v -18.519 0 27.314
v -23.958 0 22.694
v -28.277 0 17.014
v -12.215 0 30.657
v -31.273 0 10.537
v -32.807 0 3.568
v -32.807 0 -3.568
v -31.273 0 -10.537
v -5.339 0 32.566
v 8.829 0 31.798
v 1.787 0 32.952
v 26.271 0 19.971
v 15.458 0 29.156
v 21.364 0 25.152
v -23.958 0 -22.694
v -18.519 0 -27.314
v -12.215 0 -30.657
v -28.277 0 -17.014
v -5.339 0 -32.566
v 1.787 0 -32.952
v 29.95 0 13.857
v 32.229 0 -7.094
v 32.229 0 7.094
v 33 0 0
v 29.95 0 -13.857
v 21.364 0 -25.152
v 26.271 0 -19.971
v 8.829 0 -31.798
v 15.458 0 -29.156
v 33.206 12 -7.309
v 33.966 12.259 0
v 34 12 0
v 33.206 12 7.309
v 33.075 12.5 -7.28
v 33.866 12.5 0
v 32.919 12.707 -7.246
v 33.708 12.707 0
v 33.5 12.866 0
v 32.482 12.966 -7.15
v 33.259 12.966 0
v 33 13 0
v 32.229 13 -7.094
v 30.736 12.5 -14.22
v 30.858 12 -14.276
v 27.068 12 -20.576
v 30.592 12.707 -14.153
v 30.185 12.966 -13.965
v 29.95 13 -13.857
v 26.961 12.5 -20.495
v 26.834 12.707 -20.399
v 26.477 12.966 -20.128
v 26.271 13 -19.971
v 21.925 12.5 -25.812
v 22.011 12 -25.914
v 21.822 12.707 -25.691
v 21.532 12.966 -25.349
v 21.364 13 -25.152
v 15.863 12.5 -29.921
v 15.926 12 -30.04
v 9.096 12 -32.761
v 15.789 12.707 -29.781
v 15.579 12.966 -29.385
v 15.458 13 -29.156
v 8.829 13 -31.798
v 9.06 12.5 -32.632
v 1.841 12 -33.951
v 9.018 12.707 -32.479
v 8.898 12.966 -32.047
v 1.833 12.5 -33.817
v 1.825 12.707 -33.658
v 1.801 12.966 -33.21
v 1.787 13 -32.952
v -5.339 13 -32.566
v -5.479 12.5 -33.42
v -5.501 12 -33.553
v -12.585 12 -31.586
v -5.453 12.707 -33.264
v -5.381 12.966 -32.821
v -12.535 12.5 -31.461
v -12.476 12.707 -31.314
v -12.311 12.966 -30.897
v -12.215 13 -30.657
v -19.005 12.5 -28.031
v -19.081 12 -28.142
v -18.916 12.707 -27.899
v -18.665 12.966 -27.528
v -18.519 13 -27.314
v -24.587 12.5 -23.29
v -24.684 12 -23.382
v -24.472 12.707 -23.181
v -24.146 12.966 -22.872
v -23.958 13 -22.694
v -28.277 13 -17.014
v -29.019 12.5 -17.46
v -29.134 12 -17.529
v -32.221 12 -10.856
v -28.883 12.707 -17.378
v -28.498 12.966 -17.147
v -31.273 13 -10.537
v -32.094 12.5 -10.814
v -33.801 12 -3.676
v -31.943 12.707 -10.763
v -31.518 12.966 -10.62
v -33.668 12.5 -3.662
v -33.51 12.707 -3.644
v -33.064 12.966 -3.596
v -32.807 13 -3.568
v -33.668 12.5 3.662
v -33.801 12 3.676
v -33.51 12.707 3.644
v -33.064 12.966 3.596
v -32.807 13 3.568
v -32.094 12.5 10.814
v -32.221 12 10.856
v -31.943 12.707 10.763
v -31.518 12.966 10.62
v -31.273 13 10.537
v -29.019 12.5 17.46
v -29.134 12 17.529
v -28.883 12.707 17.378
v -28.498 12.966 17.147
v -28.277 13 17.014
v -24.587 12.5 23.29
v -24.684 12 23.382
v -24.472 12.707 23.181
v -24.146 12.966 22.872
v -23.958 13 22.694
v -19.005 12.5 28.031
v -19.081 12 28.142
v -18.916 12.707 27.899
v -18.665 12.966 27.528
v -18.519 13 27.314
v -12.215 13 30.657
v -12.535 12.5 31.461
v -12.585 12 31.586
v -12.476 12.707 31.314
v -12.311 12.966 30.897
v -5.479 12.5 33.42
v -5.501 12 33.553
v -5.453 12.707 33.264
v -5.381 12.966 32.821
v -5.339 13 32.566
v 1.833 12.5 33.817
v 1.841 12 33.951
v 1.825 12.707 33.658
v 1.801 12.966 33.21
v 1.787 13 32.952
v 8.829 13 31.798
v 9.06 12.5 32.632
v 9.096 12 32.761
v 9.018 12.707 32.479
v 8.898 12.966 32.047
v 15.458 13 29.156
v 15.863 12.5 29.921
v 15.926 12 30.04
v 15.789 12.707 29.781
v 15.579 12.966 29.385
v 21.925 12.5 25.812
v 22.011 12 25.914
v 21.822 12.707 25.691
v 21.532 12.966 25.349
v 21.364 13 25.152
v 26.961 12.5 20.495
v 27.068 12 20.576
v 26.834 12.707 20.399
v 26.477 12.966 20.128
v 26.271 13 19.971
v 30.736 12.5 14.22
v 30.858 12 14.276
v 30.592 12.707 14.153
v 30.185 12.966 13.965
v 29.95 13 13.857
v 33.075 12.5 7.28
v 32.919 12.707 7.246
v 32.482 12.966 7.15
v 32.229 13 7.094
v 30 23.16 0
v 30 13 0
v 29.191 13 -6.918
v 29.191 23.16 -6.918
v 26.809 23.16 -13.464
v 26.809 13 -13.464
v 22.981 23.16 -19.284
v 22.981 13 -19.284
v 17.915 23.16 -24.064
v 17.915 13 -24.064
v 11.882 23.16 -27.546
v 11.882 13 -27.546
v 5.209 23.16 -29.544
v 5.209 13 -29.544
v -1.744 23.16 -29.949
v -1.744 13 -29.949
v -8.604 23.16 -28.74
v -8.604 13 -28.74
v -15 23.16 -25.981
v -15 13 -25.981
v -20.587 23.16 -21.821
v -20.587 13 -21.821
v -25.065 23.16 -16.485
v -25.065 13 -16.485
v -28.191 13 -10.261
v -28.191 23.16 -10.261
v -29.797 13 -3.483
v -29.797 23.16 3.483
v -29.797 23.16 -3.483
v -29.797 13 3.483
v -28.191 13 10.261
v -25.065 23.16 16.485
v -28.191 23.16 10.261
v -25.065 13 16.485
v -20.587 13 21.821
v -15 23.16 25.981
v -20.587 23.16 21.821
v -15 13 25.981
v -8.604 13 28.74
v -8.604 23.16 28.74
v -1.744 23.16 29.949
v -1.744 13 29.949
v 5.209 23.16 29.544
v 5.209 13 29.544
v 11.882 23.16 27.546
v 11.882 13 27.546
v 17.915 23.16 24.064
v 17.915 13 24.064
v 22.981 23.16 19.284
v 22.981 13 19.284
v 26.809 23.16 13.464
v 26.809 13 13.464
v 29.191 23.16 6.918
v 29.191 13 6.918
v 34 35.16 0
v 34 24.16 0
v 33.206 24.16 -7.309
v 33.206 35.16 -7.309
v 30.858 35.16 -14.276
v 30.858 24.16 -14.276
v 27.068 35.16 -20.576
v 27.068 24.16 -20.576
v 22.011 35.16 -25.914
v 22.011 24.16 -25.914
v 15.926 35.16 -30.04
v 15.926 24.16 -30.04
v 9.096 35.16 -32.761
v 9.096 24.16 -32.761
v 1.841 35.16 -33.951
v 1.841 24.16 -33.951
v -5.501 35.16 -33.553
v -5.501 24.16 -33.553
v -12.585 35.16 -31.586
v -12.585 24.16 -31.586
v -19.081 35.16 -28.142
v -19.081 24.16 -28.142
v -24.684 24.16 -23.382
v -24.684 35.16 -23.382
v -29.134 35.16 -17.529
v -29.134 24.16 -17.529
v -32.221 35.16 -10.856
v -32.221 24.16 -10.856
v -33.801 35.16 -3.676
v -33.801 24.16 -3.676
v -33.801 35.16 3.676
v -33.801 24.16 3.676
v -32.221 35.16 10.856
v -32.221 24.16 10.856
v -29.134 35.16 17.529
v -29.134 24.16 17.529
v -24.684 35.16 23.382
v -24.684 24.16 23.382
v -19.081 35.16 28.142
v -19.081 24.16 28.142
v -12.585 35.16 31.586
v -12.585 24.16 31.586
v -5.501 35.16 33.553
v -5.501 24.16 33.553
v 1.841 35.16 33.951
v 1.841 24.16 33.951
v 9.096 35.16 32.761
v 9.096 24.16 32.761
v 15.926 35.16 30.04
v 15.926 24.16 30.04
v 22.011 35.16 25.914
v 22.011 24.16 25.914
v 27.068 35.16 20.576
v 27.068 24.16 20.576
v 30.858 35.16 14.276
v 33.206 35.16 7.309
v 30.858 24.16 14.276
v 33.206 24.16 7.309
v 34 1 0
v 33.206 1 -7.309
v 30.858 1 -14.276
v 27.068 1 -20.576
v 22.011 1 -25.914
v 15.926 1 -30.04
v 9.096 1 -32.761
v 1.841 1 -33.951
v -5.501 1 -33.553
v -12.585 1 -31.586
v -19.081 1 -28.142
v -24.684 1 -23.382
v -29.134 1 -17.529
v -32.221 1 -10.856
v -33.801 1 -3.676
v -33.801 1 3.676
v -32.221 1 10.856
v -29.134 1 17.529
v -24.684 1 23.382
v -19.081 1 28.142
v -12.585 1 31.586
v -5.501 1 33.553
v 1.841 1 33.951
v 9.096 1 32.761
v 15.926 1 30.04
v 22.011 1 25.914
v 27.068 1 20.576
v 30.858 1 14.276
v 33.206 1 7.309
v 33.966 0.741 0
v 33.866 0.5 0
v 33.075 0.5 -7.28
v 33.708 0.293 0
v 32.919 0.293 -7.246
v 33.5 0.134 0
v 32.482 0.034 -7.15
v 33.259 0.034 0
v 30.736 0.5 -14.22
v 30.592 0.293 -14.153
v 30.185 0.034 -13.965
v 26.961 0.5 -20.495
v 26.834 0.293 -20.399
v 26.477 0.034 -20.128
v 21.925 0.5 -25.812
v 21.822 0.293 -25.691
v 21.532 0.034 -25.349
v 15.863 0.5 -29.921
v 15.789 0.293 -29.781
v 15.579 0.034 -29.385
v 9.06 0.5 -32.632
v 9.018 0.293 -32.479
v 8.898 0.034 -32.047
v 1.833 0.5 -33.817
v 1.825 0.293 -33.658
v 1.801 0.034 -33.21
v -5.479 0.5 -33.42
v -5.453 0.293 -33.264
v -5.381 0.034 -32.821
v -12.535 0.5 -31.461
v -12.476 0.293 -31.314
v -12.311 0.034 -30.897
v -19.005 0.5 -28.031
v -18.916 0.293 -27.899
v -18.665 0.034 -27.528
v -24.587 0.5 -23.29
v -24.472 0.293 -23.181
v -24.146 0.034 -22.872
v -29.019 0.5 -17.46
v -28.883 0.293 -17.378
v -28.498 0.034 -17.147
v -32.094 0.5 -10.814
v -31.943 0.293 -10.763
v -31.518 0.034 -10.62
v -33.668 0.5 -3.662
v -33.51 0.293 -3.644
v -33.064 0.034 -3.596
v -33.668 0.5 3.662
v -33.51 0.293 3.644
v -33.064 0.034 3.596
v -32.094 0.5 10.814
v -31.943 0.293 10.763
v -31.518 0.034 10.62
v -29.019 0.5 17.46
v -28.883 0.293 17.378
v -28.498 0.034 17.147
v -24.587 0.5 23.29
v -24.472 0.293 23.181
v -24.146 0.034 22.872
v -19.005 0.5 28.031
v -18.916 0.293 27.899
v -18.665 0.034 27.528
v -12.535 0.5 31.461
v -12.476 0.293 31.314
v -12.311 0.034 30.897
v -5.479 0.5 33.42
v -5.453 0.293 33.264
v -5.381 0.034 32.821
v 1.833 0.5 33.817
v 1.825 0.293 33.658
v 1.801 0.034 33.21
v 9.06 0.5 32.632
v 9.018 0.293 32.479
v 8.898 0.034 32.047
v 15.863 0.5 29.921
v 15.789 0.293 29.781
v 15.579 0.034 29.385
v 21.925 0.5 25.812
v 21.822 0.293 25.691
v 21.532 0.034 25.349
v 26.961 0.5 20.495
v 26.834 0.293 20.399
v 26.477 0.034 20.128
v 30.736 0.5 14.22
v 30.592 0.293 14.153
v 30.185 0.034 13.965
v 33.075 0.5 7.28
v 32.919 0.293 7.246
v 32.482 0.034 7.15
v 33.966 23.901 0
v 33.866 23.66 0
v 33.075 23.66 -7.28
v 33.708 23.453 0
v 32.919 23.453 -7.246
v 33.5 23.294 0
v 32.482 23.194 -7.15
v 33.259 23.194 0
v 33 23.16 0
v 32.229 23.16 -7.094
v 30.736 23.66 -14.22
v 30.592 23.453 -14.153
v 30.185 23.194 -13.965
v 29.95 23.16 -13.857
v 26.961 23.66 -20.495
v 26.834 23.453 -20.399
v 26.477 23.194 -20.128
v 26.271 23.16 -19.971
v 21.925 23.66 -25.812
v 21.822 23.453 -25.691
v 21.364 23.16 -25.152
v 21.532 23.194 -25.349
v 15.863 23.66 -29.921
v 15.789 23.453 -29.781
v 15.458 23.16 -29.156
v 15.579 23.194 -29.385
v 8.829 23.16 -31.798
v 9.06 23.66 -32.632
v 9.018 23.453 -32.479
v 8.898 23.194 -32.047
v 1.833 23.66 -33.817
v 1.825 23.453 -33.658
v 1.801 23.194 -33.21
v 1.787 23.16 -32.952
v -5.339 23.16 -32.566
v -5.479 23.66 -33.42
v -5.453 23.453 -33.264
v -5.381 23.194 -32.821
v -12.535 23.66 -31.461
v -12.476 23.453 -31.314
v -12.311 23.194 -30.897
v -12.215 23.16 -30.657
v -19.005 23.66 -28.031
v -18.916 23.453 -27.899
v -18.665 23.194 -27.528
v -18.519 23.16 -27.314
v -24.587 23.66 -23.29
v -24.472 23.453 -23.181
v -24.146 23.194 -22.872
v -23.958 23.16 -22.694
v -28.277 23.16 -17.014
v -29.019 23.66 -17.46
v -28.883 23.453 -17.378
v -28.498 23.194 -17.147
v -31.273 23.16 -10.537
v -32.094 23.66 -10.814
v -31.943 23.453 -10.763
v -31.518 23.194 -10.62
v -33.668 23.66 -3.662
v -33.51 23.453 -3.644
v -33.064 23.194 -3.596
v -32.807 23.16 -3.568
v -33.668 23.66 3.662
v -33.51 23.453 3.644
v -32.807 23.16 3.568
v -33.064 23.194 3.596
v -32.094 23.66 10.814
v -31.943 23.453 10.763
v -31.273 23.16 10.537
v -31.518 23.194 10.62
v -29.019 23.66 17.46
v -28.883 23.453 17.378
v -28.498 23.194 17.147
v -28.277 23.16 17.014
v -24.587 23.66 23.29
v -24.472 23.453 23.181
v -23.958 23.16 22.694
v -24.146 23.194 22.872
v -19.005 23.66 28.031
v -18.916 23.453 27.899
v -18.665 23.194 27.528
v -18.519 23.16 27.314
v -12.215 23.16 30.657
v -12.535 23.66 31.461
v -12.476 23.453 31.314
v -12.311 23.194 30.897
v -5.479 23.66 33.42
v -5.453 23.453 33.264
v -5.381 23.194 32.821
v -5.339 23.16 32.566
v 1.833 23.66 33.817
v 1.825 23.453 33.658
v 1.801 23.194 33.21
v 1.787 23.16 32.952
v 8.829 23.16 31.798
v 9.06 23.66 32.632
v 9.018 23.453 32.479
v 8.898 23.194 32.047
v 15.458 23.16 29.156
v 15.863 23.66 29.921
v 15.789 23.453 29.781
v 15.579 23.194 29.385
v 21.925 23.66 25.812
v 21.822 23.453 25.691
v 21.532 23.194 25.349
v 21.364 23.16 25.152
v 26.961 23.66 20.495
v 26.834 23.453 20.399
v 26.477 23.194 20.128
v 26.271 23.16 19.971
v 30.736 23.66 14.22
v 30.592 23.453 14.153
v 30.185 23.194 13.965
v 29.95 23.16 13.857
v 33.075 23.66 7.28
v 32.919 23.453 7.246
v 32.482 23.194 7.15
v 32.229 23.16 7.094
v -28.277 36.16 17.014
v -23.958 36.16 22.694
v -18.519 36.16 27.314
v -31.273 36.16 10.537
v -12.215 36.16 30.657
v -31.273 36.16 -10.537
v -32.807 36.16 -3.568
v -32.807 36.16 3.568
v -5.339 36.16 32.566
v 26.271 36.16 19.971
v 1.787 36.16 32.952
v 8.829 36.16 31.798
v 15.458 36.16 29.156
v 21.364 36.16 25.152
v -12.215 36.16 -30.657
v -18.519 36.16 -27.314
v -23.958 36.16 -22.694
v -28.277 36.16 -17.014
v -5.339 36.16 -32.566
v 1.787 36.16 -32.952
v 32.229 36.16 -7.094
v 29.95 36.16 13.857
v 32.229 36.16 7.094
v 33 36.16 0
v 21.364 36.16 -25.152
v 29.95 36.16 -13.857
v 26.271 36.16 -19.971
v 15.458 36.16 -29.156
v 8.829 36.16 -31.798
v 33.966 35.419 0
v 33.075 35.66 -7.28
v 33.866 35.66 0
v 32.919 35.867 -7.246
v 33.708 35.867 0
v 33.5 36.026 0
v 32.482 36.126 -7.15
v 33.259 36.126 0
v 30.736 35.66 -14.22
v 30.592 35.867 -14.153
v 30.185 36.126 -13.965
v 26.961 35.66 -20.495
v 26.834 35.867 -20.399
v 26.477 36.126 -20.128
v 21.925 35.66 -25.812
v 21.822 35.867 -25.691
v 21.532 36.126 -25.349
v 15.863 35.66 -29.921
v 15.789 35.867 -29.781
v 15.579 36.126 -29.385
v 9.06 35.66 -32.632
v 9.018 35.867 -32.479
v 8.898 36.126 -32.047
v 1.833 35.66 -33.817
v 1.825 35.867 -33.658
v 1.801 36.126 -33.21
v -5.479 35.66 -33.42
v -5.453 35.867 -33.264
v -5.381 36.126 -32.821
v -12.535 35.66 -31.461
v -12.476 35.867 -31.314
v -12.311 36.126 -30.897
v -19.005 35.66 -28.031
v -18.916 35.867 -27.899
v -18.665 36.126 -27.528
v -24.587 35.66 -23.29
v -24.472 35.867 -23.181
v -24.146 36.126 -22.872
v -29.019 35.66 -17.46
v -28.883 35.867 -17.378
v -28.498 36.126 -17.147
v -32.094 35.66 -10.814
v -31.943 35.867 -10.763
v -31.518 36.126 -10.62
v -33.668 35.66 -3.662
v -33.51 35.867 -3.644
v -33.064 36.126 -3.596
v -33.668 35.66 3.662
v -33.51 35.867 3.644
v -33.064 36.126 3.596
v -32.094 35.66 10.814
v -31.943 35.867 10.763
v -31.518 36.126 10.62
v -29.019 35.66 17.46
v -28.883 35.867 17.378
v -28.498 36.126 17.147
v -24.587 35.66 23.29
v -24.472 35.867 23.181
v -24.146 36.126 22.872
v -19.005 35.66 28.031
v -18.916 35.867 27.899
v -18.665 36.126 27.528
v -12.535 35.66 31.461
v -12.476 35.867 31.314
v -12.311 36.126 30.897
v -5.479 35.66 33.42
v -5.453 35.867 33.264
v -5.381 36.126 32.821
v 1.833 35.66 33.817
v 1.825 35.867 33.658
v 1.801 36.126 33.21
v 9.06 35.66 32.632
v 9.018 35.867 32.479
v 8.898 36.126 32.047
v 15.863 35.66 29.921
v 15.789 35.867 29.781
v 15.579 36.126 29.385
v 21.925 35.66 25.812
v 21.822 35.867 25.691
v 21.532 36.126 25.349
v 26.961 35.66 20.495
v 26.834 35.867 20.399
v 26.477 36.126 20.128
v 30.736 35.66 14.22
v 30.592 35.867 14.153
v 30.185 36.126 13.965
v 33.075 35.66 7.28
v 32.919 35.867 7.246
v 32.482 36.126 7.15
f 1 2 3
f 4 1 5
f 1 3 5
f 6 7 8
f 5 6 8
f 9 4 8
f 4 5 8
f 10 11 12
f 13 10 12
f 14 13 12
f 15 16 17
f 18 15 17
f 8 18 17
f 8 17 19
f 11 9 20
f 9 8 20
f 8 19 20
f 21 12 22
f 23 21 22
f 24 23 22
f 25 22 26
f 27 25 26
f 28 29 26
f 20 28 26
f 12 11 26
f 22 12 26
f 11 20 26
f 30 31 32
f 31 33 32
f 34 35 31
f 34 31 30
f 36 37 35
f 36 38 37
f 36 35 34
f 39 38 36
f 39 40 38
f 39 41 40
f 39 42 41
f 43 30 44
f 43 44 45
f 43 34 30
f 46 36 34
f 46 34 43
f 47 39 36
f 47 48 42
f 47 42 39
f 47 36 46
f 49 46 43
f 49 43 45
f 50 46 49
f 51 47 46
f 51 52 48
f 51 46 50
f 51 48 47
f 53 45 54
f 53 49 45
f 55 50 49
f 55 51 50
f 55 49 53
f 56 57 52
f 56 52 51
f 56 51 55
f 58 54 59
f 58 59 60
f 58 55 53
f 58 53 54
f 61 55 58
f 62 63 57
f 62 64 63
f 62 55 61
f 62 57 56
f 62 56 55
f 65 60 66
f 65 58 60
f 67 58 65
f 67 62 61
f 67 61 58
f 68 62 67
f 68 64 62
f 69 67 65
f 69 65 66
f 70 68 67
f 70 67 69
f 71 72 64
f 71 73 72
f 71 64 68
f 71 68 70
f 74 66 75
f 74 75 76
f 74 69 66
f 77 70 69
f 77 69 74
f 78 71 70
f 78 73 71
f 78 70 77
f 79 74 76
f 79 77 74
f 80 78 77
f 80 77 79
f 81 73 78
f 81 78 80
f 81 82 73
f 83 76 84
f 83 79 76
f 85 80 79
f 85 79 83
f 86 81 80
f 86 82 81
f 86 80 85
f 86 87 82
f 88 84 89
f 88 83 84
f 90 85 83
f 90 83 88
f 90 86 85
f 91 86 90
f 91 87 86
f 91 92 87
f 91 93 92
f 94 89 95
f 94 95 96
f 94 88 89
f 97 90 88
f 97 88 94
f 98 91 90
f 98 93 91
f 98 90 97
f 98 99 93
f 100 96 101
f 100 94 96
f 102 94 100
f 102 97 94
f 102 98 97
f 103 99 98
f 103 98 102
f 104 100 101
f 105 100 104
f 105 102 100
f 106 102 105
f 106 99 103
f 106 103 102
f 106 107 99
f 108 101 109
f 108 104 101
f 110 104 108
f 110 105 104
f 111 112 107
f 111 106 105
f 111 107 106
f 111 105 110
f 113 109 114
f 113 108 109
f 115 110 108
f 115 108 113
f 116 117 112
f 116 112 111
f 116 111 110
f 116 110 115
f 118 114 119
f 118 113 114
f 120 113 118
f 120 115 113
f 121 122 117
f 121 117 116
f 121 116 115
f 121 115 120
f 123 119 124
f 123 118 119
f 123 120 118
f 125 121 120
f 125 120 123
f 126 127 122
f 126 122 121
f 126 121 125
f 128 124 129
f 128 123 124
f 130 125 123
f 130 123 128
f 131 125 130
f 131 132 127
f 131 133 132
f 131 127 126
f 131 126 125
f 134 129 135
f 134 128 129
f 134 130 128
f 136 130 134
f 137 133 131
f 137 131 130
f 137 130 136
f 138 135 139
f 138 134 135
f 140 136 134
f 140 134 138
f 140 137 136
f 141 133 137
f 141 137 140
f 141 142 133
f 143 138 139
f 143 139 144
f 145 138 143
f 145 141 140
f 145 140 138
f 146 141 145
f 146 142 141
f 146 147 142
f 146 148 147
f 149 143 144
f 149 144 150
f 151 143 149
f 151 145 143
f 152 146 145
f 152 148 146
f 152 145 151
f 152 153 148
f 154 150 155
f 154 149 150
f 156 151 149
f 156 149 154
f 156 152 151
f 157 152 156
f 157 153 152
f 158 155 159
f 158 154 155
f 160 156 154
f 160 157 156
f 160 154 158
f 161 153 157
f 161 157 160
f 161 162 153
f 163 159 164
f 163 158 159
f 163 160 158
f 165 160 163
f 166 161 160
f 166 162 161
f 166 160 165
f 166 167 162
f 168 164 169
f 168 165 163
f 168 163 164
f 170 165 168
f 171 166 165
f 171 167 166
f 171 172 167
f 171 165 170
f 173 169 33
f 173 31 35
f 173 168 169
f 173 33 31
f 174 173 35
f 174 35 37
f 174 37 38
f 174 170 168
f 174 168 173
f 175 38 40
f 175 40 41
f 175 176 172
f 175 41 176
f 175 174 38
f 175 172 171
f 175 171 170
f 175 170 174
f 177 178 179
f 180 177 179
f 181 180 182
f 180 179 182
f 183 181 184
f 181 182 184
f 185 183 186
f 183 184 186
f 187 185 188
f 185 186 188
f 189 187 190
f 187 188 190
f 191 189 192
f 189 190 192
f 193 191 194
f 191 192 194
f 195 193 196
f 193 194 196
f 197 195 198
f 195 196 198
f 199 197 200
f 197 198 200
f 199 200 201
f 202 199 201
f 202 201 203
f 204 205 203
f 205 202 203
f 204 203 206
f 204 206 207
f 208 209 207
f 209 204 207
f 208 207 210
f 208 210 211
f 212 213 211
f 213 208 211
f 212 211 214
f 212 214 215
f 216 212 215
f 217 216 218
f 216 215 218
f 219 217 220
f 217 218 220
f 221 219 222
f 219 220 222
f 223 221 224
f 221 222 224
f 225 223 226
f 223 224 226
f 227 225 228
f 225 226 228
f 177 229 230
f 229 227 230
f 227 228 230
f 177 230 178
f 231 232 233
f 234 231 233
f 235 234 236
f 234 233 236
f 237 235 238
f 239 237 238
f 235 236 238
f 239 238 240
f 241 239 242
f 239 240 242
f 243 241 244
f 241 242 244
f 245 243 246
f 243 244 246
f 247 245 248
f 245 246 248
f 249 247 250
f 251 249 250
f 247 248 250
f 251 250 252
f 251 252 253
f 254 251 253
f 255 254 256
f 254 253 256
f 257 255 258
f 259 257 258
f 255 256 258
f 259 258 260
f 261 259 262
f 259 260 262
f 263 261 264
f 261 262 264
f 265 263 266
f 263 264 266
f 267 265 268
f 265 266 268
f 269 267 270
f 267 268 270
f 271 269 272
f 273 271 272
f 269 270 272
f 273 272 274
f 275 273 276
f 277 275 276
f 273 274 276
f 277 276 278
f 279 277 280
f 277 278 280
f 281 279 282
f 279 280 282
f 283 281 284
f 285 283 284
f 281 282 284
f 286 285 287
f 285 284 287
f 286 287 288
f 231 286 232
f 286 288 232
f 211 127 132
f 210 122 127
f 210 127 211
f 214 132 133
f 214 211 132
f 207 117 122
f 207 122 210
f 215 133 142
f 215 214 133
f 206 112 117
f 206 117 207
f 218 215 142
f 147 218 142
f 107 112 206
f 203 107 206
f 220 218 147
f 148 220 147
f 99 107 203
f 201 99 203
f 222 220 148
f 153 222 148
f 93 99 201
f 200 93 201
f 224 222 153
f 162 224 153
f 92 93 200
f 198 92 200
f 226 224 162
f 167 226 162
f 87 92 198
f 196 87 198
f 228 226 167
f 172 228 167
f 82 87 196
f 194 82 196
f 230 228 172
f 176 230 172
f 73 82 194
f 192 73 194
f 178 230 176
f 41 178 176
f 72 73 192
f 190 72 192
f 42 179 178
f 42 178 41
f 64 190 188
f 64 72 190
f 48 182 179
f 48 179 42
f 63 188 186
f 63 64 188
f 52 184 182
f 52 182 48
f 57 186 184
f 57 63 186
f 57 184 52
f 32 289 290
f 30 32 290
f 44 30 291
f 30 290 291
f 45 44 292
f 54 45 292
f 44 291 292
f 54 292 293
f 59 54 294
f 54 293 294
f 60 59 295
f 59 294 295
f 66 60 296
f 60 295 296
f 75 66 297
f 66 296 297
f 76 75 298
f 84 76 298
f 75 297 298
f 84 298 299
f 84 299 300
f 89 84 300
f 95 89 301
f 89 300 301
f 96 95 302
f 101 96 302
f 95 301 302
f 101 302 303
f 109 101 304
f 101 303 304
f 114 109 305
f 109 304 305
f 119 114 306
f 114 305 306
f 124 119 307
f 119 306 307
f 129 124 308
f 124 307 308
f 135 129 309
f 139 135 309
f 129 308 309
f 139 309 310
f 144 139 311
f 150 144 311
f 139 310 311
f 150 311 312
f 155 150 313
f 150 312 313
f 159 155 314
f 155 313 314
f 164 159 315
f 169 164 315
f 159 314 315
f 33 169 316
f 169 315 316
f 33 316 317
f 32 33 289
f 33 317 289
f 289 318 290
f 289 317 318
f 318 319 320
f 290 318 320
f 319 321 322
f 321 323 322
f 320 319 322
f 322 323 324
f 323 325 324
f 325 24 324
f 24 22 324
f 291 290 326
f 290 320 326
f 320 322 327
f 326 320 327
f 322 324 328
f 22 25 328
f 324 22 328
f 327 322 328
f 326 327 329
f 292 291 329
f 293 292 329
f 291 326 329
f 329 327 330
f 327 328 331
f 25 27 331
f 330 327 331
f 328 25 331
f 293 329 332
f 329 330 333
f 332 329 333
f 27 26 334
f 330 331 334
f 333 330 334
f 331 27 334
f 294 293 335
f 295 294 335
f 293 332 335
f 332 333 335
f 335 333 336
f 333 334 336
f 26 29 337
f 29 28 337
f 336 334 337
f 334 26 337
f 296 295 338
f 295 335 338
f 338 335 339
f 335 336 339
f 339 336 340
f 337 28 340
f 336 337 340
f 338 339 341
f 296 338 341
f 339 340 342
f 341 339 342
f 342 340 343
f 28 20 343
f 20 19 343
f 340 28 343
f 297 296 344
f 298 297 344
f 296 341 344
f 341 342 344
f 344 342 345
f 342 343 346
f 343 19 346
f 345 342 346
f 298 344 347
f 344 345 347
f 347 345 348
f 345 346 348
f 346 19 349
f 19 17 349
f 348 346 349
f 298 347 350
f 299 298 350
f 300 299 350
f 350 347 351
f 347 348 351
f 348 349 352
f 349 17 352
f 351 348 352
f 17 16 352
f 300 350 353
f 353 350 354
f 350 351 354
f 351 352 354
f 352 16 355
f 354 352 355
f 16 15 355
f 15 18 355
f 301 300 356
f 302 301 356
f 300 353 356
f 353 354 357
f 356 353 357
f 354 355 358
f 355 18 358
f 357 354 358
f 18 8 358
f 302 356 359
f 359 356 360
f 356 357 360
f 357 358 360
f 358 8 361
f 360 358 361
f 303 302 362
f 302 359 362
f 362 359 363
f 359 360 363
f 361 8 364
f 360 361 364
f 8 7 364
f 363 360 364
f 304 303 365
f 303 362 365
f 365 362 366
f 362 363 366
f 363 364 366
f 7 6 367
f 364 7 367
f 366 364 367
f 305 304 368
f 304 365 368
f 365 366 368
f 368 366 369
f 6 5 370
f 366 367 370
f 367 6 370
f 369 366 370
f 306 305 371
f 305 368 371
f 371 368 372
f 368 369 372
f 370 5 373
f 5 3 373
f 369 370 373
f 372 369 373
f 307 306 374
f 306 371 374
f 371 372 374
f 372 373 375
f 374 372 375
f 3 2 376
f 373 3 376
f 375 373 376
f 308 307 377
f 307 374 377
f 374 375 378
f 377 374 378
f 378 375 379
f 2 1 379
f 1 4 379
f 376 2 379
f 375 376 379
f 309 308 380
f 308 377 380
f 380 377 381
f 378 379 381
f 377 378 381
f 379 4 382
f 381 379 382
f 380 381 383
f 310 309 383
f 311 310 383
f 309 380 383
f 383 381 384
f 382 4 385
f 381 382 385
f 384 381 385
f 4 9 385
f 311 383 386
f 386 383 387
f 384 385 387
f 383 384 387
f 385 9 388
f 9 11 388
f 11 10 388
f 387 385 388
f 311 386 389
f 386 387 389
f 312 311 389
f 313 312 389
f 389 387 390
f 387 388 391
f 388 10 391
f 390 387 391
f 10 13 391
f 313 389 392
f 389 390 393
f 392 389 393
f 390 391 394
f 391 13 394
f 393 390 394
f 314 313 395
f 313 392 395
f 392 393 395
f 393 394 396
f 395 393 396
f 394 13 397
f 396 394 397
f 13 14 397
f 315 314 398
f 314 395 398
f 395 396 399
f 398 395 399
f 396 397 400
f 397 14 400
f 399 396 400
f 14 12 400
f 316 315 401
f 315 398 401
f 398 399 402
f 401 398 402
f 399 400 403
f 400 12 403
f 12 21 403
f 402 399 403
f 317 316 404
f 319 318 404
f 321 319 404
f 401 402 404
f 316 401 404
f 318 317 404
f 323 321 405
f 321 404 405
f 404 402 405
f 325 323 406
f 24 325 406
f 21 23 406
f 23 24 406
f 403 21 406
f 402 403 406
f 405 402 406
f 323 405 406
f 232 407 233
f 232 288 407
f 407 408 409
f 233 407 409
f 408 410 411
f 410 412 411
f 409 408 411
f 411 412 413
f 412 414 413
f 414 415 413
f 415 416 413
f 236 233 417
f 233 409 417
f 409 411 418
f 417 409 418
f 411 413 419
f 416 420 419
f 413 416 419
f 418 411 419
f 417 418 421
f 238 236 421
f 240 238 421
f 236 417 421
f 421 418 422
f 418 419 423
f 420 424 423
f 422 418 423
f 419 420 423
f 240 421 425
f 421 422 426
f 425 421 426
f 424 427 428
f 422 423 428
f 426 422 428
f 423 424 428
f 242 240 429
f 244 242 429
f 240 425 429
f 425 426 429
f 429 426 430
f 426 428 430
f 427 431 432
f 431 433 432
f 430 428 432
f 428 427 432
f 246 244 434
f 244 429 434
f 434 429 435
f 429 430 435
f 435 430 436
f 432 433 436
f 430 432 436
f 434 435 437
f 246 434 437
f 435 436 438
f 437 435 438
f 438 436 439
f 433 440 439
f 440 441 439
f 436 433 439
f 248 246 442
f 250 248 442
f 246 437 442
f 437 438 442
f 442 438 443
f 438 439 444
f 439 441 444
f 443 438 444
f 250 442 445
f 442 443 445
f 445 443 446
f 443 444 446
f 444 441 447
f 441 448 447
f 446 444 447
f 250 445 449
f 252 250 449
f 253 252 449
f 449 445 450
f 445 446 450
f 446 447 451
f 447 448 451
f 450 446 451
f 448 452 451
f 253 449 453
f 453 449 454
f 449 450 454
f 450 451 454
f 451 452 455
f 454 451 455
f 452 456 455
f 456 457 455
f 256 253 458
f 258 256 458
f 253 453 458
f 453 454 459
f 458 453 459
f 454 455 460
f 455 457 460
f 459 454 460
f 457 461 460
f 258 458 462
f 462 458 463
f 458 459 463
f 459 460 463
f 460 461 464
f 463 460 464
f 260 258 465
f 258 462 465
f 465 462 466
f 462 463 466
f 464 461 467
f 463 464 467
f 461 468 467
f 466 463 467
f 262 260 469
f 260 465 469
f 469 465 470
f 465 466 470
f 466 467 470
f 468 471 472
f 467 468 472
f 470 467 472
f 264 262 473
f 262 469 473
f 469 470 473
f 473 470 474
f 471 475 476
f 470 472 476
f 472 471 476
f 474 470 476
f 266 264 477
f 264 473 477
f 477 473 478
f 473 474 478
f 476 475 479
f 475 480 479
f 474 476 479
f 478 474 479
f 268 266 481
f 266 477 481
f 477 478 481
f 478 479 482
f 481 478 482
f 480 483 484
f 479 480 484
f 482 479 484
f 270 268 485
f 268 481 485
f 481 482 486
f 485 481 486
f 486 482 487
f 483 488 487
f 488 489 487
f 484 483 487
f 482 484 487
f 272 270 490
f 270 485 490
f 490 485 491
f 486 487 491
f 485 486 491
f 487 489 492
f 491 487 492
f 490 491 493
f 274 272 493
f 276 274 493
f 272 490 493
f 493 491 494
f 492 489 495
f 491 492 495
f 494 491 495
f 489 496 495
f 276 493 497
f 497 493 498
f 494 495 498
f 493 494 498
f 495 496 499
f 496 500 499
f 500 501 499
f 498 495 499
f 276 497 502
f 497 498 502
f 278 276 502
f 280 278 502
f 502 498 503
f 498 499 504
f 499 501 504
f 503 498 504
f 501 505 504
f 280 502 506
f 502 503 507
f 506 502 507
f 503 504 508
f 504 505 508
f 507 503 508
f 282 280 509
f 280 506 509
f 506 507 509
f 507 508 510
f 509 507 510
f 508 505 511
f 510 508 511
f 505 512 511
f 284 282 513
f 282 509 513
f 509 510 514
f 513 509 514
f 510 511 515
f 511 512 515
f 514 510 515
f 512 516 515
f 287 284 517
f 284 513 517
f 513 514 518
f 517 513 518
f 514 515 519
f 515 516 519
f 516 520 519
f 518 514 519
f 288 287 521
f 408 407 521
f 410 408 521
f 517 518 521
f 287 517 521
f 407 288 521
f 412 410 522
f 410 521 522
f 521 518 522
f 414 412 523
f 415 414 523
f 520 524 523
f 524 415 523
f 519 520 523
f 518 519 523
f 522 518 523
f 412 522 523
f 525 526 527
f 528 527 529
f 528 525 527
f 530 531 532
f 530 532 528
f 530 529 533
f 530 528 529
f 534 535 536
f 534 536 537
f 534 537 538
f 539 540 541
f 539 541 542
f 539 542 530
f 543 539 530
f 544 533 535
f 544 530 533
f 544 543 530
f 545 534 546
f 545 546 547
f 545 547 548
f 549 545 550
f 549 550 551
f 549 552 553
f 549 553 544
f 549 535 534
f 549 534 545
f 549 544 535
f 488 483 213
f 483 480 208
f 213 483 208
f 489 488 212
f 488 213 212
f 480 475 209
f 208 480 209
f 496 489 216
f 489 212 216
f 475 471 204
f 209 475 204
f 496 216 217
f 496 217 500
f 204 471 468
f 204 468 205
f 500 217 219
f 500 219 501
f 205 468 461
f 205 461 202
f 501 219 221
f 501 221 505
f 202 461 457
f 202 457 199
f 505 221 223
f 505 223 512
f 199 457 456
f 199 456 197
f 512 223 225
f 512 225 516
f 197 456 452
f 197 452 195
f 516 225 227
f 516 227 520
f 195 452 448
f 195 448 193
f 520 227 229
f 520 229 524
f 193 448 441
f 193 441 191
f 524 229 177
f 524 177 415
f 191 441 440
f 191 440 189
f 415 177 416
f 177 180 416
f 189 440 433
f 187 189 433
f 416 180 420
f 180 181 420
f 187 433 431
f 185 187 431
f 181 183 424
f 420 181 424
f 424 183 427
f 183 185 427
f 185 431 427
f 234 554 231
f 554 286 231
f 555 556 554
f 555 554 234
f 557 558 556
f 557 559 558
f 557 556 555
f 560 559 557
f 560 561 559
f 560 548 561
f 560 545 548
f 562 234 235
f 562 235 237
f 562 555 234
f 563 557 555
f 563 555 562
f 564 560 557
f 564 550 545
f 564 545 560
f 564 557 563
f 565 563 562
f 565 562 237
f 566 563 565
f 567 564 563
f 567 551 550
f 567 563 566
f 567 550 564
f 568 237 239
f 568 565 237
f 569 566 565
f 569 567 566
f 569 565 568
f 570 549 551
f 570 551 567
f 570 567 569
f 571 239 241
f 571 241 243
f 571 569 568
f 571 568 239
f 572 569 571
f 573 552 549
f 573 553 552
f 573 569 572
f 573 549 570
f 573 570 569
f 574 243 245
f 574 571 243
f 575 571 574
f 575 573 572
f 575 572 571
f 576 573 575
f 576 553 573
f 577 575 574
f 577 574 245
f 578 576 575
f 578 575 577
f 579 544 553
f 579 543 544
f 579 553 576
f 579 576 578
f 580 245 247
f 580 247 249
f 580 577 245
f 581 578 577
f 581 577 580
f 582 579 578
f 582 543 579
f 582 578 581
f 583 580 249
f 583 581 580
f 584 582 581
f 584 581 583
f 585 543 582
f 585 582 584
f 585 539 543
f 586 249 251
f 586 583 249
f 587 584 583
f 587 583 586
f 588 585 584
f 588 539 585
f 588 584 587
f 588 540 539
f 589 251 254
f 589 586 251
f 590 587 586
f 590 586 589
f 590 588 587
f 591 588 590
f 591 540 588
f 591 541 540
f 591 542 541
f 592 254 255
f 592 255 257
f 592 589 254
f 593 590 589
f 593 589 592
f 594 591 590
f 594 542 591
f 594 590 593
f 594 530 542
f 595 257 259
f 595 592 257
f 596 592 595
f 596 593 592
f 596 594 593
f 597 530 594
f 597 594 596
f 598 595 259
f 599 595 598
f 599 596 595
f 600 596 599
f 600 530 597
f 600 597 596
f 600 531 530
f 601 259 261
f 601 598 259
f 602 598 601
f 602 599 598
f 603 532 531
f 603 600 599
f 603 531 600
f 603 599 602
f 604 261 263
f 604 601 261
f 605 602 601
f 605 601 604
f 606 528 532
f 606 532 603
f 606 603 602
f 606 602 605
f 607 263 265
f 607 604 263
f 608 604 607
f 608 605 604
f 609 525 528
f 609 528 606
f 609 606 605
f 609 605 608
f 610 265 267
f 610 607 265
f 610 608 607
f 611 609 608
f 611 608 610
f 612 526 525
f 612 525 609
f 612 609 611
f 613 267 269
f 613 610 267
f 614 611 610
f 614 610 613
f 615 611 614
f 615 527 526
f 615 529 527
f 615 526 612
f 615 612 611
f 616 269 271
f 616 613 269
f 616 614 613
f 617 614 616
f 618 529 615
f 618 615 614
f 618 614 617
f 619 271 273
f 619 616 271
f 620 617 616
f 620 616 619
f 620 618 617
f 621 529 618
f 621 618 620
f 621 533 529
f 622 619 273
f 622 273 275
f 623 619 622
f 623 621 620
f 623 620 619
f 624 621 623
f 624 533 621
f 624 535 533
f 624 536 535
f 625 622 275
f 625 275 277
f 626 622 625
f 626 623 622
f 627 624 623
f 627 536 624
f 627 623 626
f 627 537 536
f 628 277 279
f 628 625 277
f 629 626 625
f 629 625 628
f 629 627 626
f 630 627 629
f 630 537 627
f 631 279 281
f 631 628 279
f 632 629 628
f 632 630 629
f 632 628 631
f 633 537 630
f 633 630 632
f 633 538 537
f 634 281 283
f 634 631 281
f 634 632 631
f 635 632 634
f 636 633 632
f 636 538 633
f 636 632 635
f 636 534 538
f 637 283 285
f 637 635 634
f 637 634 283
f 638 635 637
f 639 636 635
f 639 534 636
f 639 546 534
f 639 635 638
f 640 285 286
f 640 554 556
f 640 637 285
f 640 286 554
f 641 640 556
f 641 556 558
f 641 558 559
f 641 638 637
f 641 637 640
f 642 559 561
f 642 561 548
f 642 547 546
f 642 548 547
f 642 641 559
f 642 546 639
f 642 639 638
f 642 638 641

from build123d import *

# Parameters (mm, degrees)
SKETCH1_R           = 34.00044
BOSS_EXTRUDE1_DEPTH = 13
FILLET1_R           = 1
LPATTERN1_COUNT     = 2
LPATTERN1_PITCH     = 23.16
SKETCH2_R           = 30
BOSS_EXTRUDE2_DEPTH = 23.16


with BuildPart() as part:
    # Sketch1 → Boss-Extrude1 (new body)
    with BuildSketch(Plane(origin=(0, 0, 0), x_dir=(1, 0, 0), z_dir=(0, 1, 0))):
        Circle(SKETCH1_R)
    extrude(amount=BOSS_EXTRUDE1_DEPTH)

    # Fillet1
    fillet1_edges = [part.edges().sort_by_distance(p)[0] for p in [
        (-34.00044, 0, 0),
        (-34.00044, 13, 0),
    ]]
    fillet(fillet1_edges, radius=FILLET1_R)


with BuildPart() as lpattern1_1:
    # LPattern1: pattern copy
    add(part.part.moved(Location(Vector(0, 1, 0) * (1 * LPATTERN1_PITCH))))


with BuildPart() as part_1:
    add(part.part)

    add(lpattern1_1.part)  # Boss-Extrude2 merges LPattern1_1
    # Sketch2 → Boss-Extrude2 (add)
    with BuildSketch(Plane(origin=(0, 13, 0), x_dir=(1, 0, 0), z_dir=(0, 1, 0))):
        Circle(SKETCH2_R)
    extrude(amount=BOSS_EXTRUDE2_DEPTH)


solid = part_1.part
